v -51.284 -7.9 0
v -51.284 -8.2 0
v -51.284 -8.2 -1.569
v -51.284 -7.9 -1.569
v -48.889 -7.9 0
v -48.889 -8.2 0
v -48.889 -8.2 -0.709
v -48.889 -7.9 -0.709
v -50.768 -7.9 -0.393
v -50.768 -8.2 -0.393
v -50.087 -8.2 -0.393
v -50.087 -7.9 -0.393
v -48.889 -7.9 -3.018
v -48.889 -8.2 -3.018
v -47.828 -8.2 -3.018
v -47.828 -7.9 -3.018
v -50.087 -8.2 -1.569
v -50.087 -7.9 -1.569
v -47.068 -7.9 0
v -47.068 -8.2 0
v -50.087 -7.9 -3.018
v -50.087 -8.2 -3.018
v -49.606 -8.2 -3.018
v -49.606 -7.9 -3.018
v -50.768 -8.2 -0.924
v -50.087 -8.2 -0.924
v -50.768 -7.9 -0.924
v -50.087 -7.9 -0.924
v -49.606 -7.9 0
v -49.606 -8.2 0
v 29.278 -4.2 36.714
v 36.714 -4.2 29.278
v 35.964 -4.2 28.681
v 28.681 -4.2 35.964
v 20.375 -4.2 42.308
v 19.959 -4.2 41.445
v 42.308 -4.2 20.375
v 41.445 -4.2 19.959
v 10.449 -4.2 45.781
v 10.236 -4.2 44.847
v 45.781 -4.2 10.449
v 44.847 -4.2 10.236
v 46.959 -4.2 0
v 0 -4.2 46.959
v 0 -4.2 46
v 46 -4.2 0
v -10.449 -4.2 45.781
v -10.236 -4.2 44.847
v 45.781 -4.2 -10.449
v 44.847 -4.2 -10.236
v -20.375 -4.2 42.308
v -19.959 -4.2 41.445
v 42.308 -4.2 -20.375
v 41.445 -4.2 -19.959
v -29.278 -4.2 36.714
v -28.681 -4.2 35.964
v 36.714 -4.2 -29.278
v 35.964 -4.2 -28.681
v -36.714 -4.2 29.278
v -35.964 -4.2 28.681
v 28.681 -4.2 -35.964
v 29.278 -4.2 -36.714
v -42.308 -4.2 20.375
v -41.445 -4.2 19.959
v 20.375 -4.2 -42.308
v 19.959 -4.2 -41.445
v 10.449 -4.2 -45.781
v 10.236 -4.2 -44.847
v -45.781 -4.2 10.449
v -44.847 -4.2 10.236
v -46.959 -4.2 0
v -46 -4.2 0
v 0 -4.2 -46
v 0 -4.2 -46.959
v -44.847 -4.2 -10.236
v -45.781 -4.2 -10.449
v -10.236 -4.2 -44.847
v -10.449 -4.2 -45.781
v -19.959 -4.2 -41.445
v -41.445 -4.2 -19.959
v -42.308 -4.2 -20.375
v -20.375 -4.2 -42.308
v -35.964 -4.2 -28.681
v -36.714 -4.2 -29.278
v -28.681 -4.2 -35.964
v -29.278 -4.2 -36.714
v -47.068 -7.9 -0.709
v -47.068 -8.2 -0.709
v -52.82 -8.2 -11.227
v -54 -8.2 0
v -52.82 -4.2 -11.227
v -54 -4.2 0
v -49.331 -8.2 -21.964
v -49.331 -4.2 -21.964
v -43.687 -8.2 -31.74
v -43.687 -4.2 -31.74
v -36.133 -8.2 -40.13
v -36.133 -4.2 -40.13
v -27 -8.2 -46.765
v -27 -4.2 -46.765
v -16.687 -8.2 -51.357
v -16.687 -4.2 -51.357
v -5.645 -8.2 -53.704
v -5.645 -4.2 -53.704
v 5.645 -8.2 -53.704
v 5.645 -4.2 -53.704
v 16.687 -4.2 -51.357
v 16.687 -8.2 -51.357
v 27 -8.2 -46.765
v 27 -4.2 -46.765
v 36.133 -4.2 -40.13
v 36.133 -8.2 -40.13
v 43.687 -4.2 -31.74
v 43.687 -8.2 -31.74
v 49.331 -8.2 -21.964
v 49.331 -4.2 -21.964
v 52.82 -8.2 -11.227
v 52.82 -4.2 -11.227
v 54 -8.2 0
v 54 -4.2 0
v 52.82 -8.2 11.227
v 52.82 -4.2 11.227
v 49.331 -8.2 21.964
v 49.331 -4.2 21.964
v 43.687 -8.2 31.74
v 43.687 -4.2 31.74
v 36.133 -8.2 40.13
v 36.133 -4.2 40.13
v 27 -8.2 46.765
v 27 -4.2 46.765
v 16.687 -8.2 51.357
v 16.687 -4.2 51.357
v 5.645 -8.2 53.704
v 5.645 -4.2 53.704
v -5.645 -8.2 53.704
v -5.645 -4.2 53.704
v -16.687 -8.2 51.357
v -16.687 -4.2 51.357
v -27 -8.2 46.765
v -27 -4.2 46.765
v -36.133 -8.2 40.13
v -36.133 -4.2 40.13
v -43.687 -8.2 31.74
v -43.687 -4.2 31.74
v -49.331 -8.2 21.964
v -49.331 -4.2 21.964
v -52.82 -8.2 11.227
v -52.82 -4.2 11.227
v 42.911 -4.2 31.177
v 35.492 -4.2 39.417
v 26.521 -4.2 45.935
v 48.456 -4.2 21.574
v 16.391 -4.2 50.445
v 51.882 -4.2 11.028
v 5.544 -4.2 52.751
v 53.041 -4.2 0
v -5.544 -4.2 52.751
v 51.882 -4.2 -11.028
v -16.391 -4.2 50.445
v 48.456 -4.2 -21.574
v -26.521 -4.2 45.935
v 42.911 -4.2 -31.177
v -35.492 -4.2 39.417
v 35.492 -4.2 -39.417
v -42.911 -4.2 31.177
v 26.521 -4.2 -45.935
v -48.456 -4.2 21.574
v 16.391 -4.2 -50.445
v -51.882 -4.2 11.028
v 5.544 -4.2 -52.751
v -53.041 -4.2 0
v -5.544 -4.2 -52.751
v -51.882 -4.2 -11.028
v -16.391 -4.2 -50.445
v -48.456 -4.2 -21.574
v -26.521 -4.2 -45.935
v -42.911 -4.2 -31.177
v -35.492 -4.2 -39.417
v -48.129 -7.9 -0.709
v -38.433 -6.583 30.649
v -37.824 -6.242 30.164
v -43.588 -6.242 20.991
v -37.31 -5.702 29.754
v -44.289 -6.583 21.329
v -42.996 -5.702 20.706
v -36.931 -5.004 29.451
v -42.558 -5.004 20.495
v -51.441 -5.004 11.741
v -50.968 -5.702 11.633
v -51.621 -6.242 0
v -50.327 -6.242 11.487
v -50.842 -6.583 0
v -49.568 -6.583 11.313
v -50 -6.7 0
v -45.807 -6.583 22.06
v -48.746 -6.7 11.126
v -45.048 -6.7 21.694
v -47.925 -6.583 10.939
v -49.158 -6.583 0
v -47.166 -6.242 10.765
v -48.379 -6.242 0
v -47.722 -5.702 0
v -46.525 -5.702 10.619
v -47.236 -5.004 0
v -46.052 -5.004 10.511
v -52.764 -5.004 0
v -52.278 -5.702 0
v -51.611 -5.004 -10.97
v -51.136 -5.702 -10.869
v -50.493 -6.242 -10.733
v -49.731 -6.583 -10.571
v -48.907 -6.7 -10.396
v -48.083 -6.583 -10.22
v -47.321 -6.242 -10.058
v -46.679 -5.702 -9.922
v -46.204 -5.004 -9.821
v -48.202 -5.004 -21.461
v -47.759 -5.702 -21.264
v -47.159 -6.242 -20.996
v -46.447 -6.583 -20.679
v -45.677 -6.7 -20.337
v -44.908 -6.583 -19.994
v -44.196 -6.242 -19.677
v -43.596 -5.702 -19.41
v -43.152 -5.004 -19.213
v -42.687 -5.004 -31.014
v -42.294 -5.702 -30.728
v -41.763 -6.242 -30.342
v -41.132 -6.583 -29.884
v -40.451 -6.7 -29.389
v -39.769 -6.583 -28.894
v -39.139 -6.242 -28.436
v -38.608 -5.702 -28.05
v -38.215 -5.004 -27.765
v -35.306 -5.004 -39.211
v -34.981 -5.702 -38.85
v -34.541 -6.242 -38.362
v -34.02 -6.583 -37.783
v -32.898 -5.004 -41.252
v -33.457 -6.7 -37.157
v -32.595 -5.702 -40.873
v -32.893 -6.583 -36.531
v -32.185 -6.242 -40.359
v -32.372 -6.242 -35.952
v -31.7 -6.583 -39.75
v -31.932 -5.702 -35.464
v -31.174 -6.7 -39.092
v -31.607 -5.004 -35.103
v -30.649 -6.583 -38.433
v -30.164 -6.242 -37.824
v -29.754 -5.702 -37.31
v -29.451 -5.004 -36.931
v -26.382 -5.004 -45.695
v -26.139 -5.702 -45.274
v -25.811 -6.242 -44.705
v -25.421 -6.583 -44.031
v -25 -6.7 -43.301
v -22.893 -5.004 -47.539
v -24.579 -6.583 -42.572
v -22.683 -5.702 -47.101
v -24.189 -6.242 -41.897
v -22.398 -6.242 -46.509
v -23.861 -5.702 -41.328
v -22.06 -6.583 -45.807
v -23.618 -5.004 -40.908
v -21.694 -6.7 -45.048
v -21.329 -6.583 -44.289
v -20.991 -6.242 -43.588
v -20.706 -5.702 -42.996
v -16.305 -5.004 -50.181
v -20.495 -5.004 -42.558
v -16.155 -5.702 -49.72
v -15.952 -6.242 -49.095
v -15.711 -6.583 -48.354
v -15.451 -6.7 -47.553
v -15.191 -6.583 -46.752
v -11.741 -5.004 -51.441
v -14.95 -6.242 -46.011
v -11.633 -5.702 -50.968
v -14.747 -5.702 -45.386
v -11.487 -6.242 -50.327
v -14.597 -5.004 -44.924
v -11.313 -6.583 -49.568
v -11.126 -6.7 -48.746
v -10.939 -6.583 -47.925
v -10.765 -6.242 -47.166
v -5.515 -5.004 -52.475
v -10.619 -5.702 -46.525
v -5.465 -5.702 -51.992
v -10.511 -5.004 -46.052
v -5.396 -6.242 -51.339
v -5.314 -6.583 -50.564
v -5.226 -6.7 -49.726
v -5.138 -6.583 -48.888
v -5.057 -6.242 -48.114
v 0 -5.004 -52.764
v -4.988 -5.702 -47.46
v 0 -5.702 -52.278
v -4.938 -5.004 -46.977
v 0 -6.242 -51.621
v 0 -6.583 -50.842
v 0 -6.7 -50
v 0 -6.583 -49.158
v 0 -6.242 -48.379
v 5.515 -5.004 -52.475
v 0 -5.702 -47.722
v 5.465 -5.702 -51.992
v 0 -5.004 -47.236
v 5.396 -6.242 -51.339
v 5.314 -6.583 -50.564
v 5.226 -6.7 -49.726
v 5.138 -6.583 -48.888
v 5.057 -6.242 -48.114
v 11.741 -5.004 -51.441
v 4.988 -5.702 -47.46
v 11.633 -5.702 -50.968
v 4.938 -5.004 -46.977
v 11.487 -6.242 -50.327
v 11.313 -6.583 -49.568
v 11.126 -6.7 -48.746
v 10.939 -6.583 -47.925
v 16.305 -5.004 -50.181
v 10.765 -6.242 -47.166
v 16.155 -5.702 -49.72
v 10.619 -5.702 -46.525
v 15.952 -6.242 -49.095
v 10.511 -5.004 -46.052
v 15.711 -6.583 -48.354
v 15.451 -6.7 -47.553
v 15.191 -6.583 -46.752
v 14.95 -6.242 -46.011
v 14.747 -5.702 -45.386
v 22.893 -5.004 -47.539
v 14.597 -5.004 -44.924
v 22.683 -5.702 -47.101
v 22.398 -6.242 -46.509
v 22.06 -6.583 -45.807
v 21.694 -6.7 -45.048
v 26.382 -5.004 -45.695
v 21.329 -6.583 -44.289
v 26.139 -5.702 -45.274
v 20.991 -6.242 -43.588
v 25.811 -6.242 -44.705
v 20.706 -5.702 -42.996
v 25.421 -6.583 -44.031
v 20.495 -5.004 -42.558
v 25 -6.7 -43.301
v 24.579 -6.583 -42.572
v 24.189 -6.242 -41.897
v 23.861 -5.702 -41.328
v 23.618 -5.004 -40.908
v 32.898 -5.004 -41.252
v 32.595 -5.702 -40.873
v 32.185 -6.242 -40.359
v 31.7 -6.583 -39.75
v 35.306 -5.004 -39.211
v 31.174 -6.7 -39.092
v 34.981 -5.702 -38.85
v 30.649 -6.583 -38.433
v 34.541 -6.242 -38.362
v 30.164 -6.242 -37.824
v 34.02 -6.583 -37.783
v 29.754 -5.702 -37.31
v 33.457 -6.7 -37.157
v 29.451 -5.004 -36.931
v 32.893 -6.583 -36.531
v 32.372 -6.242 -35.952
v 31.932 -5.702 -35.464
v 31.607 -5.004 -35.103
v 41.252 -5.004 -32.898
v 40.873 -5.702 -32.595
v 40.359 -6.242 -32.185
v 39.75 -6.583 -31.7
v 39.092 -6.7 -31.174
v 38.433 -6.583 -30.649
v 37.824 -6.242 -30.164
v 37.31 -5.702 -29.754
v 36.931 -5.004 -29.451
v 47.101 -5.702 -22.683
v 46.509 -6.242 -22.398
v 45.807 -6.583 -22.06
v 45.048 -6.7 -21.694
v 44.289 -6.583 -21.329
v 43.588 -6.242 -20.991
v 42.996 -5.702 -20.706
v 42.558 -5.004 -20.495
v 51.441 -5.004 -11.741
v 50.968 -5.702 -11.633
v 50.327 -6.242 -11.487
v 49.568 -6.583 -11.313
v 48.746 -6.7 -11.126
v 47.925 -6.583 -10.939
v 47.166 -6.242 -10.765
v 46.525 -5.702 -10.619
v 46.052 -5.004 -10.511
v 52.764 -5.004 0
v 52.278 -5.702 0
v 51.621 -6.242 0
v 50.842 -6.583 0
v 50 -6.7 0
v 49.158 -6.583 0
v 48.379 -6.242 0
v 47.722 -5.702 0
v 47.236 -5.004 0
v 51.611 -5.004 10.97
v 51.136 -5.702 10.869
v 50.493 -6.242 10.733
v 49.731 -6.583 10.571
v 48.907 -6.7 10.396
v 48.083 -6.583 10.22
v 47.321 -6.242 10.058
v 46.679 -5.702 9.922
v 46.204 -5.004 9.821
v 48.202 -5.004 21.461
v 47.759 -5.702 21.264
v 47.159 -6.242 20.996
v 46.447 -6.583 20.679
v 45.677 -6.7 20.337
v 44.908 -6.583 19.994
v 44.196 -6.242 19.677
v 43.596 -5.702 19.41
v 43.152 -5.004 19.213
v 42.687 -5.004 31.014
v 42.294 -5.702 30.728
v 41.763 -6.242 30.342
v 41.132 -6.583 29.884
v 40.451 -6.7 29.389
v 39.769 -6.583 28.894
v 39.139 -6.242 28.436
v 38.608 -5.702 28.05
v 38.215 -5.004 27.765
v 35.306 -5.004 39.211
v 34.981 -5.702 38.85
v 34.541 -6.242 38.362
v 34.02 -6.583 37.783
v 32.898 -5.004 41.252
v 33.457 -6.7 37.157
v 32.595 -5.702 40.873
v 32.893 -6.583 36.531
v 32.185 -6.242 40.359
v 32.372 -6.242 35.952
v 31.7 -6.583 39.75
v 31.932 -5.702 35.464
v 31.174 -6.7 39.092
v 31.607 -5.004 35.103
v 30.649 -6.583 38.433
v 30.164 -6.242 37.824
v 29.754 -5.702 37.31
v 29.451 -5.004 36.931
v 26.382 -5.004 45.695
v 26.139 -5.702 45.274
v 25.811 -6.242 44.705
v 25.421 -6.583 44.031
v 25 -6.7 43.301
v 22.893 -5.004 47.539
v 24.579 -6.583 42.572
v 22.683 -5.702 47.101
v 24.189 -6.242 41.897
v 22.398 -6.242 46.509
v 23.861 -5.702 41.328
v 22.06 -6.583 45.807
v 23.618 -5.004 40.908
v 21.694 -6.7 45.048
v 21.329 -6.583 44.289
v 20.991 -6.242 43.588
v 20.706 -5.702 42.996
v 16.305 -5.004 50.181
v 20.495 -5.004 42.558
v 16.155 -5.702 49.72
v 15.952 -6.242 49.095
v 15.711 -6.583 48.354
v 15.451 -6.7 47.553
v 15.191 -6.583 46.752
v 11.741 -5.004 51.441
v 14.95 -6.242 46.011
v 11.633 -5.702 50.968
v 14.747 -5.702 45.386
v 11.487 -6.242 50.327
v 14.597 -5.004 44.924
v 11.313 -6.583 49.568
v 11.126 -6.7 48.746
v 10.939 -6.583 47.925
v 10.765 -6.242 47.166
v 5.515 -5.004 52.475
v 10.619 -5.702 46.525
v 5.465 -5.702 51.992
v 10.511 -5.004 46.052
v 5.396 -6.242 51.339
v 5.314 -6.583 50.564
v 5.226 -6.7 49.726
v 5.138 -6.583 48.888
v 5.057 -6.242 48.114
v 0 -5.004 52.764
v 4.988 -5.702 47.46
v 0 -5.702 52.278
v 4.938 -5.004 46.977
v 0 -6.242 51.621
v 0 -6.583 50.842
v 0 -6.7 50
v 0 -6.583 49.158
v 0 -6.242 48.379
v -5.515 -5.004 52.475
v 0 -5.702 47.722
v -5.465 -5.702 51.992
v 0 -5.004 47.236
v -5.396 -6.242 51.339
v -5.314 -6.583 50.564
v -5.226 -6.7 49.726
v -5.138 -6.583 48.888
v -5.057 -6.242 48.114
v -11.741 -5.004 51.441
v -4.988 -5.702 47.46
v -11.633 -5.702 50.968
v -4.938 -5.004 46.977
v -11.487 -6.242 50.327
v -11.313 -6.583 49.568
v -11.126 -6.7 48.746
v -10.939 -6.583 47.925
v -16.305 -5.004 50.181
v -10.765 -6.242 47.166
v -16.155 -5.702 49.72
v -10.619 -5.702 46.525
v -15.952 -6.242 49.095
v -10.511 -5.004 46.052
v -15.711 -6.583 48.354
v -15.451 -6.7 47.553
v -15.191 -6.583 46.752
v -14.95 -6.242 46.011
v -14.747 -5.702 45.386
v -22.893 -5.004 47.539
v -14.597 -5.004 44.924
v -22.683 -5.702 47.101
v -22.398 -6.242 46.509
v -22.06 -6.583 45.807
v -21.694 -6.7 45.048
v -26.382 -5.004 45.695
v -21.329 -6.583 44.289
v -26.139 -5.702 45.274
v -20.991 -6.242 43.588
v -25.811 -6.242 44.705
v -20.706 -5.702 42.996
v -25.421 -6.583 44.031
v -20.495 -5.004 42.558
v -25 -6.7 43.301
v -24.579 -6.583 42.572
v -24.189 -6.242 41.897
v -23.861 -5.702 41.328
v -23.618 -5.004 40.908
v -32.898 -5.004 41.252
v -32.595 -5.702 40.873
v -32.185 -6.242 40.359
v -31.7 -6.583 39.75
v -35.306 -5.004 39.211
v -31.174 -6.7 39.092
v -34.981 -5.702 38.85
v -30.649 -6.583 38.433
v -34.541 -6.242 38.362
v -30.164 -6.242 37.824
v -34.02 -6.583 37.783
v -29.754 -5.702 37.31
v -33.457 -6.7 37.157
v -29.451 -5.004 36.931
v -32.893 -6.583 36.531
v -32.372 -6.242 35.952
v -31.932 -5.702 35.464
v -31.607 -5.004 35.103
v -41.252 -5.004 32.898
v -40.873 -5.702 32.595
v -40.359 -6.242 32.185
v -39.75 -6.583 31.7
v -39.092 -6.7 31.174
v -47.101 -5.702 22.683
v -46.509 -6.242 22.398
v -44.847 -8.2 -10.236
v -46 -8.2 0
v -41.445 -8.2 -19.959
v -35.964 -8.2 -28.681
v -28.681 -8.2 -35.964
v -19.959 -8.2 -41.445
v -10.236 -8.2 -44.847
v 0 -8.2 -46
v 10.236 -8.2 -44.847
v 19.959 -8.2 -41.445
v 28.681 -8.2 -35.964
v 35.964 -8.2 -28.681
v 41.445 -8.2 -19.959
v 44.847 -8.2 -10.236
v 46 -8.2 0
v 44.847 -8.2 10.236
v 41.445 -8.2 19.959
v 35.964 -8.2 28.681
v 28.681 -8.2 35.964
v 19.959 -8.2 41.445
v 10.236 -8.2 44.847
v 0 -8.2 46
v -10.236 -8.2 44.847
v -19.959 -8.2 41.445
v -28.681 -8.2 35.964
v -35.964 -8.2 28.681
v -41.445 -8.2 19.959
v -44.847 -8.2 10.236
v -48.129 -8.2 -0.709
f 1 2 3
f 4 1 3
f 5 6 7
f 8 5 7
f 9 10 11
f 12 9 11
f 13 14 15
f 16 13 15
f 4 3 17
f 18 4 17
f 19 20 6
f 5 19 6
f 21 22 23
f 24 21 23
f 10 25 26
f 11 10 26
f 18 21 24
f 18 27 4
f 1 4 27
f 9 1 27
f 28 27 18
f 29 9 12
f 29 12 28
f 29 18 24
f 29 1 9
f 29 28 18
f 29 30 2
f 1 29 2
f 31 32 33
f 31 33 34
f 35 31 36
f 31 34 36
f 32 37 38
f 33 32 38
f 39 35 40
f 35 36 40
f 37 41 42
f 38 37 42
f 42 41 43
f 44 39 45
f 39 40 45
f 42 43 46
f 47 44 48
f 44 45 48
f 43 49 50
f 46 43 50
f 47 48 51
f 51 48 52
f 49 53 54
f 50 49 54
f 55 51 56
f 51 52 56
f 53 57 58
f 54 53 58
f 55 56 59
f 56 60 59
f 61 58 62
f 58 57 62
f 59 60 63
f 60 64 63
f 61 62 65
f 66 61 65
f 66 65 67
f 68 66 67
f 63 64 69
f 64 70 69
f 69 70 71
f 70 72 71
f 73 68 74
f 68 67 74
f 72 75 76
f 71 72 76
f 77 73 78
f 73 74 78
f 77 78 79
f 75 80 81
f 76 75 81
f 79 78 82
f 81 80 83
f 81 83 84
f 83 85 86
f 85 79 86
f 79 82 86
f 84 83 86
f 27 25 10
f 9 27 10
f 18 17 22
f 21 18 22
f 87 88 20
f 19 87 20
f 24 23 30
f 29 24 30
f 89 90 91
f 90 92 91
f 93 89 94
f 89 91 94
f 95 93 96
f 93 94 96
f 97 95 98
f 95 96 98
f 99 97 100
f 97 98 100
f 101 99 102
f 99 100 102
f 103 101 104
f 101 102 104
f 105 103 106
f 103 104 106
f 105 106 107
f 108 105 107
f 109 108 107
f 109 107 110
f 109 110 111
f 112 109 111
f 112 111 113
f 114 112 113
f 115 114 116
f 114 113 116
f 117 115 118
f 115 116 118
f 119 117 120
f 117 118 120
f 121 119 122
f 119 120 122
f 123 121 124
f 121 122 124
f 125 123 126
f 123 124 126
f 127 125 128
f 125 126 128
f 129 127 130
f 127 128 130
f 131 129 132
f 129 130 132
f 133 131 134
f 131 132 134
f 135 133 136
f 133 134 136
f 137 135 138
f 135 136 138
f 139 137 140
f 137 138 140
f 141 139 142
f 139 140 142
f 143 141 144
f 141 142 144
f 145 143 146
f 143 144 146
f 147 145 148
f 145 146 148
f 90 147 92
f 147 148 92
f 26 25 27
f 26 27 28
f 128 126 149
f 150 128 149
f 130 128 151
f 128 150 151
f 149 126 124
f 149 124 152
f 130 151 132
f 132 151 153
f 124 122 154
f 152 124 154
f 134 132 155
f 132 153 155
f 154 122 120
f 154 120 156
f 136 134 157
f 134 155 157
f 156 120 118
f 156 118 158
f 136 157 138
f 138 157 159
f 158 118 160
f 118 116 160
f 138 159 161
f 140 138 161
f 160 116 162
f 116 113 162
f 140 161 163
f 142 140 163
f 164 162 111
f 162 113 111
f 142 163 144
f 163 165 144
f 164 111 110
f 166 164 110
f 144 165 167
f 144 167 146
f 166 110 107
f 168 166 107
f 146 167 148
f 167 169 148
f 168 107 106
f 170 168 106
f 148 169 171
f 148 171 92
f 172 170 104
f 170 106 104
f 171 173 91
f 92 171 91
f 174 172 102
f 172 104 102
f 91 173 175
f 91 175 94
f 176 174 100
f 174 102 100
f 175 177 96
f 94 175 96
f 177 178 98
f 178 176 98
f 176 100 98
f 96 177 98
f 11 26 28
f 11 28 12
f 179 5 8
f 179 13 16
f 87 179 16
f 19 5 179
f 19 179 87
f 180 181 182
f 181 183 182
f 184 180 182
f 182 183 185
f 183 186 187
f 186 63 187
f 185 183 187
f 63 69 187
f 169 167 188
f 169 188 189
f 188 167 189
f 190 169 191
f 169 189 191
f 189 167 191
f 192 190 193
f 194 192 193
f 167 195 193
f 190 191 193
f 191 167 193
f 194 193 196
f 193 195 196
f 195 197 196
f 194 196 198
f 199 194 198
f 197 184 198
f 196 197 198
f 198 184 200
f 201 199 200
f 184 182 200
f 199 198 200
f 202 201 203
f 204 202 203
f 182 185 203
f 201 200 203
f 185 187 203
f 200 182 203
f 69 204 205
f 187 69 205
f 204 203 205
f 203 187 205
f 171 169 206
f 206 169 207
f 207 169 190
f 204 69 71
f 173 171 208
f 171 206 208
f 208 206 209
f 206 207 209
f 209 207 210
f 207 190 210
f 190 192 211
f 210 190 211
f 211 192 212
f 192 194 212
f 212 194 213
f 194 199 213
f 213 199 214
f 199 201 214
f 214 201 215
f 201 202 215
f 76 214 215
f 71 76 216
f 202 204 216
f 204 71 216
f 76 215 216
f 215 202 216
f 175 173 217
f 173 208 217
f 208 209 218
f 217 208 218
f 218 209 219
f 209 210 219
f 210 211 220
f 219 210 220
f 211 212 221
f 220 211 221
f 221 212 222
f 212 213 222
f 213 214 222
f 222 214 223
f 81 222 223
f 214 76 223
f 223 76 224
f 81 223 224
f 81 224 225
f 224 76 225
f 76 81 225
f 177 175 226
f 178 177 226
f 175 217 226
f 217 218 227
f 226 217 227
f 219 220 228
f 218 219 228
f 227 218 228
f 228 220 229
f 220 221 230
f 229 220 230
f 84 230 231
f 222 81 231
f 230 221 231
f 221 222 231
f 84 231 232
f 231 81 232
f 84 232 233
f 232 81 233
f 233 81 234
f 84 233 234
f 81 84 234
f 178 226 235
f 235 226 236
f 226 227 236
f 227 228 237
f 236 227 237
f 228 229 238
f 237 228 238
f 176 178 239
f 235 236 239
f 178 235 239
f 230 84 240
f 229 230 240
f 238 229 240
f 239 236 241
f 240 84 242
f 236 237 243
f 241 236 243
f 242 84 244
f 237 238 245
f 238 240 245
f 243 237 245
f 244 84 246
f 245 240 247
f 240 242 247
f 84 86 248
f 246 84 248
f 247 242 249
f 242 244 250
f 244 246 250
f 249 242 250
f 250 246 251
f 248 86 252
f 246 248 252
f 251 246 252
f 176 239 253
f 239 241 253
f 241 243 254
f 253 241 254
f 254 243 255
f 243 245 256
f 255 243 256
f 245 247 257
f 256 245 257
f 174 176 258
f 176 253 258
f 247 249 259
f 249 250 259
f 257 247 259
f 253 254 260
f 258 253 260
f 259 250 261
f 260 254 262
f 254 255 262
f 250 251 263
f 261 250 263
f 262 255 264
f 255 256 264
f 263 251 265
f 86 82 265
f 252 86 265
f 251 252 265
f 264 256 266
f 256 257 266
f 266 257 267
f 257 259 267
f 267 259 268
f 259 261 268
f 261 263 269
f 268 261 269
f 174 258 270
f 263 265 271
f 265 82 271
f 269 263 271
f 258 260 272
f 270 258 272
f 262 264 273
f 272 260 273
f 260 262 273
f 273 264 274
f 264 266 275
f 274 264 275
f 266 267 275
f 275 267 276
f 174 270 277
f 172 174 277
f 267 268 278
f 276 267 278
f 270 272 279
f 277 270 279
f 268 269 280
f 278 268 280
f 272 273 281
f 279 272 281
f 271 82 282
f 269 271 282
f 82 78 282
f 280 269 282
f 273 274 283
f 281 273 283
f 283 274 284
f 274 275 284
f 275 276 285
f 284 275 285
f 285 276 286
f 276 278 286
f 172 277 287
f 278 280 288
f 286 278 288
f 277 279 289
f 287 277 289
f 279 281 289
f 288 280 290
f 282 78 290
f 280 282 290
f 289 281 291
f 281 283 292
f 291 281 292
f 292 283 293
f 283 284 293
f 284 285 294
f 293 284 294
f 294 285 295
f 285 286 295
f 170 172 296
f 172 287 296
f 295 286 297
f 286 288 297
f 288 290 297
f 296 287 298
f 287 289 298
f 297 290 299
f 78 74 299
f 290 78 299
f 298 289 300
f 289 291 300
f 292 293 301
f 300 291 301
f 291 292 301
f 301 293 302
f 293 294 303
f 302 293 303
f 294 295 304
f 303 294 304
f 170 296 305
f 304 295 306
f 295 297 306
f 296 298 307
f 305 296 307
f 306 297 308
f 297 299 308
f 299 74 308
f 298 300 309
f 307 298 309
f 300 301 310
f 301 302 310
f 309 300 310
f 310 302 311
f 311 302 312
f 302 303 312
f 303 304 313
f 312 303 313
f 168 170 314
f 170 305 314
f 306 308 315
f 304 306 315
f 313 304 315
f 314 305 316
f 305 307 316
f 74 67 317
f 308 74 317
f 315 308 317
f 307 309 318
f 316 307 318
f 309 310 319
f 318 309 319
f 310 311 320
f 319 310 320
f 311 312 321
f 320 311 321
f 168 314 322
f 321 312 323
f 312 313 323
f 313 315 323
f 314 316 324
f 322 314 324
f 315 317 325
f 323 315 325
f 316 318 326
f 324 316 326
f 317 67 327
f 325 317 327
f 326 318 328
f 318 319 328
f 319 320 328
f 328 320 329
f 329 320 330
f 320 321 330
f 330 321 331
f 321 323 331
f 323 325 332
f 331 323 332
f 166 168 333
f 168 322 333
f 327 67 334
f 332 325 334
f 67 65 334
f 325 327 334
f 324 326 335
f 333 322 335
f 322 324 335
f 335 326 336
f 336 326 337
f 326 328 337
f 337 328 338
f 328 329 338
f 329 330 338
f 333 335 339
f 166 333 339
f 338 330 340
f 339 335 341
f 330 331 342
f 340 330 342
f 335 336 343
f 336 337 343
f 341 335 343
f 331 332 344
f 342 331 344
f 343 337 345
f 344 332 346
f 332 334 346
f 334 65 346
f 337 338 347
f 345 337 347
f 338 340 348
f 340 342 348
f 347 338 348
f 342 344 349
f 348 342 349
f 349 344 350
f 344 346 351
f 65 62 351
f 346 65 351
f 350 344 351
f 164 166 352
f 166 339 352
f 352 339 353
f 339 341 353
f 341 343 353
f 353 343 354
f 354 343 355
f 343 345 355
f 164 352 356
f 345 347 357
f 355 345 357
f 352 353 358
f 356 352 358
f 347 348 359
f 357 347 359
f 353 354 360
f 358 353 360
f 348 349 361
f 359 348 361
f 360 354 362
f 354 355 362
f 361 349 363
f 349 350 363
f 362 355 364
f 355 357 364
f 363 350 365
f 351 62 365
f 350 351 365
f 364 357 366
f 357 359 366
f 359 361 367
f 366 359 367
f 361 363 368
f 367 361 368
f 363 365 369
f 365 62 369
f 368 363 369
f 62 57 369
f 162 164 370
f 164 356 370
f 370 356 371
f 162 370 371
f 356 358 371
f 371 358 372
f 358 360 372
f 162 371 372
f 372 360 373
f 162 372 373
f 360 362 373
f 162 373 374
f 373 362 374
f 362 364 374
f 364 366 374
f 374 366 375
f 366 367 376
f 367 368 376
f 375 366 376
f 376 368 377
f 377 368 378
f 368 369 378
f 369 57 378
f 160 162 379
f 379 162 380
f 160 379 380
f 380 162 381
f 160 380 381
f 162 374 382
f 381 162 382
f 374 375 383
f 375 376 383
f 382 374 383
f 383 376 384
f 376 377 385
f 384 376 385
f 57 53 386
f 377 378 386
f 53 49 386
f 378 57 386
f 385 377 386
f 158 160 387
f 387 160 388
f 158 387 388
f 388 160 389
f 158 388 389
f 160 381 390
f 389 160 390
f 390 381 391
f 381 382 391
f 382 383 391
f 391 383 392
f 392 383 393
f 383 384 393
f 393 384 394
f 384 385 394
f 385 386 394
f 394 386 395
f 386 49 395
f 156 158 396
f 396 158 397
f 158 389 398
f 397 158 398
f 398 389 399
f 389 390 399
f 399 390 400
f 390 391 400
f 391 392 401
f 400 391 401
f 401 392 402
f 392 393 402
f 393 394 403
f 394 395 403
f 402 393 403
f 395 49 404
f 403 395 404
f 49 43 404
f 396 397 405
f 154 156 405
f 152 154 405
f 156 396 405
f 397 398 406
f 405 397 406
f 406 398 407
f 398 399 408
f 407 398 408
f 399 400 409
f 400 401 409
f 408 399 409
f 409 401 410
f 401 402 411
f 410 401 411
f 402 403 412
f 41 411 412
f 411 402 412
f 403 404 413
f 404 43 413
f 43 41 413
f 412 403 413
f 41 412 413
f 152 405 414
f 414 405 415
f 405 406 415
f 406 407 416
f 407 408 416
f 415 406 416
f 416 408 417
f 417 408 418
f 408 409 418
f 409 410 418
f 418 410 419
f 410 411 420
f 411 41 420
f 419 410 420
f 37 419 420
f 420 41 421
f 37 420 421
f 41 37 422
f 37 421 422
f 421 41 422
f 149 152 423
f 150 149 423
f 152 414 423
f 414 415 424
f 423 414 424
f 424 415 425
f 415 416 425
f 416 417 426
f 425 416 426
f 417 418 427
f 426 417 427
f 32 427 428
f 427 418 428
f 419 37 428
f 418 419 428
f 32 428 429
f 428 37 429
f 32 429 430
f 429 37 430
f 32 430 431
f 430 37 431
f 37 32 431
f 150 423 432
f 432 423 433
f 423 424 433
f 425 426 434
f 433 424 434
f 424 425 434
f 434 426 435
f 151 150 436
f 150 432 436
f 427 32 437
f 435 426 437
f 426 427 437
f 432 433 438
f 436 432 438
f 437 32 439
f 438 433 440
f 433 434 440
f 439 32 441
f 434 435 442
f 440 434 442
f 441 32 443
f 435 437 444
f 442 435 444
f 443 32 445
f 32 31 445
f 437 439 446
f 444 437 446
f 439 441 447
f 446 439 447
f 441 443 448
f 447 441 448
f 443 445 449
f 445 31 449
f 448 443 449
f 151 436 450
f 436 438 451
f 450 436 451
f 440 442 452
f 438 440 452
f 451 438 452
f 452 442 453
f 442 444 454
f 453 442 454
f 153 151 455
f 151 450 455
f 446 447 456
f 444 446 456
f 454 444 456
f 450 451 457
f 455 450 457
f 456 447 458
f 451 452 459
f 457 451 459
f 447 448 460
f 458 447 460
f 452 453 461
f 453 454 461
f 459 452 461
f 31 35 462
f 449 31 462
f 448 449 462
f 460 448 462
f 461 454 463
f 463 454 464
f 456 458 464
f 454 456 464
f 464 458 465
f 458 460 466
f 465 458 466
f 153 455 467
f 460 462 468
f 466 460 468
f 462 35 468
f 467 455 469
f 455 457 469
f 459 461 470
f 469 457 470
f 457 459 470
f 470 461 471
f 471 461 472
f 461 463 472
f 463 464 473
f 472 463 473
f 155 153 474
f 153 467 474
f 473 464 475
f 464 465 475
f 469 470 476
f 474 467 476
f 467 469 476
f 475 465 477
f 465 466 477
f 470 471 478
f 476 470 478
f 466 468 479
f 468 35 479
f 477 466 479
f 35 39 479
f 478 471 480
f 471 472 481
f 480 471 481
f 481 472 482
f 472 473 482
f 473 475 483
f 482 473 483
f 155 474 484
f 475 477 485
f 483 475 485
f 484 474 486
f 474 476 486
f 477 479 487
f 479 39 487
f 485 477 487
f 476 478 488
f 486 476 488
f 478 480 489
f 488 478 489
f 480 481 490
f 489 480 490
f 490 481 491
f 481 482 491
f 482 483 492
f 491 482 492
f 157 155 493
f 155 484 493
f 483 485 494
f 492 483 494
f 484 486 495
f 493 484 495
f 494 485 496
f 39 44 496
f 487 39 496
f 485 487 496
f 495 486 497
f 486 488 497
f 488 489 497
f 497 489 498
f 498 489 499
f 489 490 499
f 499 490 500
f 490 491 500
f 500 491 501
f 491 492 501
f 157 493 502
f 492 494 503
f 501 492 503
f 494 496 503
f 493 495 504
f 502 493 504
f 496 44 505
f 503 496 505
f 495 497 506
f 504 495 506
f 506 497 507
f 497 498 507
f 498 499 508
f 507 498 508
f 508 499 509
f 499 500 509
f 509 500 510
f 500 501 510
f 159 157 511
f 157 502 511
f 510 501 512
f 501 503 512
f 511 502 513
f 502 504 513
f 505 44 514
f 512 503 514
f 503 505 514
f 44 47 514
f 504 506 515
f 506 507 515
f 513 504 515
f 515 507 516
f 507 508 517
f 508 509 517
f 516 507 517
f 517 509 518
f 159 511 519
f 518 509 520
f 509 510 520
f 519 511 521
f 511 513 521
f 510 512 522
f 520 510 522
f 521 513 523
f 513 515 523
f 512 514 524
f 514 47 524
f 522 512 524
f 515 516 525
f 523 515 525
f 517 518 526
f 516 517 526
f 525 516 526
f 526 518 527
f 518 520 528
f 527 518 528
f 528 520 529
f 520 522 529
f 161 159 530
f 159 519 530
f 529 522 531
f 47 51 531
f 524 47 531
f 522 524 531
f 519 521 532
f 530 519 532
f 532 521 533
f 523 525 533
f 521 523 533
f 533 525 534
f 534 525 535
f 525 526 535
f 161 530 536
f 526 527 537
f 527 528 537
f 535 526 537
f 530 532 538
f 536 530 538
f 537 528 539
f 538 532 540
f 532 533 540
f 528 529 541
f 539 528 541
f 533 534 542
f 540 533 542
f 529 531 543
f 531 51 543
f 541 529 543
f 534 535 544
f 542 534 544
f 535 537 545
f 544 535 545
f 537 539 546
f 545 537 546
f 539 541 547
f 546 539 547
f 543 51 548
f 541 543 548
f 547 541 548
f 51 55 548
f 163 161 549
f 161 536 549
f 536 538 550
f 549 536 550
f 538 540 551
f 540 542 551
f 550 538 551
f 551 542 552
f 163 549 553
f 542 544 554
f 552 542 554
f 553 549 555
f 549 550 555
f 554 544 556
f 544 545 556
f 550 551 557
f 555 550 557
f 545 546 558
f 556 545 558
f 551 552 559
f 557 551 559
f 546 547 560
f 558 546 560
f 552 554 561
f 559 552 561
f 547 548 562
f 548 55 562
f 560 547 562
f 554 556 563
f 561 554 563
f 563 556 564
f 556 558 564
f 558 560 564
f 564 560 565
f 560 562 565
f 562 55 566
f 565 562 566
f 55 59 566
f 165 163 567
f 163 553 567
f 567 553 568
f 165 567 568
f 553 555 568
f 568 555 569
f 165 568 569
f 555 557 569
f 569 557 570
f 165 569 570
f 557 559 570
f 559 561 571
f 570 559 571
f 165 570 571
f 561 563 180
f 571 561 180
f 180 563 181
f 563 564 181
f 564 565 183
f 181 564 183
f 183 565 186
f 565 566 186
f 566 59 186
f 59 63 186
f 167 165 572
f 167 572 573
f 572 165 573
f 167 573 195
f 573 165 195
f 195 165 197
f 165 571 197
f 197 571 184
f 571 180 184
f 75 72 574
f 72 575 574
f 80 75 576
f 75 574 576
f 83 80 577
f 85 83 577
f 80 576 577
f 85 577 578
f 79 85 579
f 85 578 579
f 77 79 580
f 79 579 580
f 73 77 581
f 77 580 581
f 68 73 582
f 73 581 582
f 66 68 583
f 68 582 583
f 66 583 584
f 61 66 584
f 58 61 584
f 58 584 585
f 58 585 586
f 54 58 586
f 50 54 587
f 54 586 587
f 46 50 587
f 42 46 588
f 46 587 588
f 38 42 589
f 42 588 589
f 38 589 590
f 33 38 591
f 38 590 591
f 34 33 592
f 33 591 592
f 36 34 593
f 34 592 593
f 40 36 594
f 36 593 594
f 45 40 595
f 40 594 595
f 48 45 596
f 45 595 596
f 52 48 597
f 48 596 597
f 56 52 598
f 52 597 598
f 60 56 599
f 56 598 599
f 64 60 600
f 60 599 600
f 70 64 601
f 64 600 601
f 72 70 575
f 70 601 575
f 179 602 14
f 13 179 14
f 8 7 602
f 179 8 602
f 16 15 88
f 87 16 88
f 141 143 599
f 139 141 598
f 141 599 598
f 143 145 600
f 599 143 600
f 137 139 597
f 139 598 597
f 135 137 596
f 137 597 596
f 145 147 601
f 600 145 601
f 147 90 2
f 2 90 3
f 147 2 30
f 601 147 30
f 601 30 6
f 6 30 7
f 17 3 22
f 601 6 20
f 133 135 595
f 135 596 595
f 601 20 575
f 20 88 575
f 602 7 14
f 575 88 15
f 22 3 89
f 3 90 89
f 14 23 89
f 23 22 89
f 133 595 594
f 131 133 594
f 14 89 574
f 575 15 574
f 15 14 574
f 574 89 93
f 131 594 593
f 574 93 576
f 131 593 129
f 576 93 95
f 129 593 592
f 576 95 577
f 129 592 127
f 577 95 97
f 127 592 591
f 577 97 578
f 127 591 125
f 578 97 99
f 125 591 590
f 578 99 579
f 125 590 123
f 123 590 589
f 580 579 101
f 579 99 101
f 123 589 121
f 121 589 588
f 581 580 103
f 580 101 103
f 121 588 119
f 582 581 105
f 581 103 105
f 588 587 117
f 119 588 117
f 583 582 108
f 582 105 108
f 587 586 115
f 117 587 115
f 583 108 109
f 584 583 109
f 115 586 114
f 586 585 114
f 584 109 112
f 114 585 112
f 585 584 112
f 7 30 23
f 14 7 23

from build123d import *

# Parameters (mm, degrees)
SKETCH4_W          = 0.681153679
SKETCH4_H          = 0.530582866
CUT_EXTRUDE1_DEPTH = 0.3


with BuildPart() as part:
    # Sketch2 → Revolve2 (revolve)
    with BuildSketch(Plane.XY):
        with BuildLine():
            Line((-46, -4.2), (-46, -6.7))
            Line((-46, -6.7), (-46, -8.2))
            Line((-46, -8.2), (-54, -8.2))
            Line((-54, -8.2), (-54, -4.2))
            Line((-54, -4.2), (-53.041381265, -4.2))
            ThreePointArc((-53.041381265, -4.2), (-50, -6.7), (-46.958618735, -4.2))
            Line((-46.958618735, -4.2), (-46, -4.2))
        make_face()
    revolve(axis=Axis((0, 30.712444699, 0), (0, -1, 0)))

    # Sketch4 → Cut-Extrude1 (cut)
    with BuildSketch(Plane.XZ.offset(8.2)):
        Polygon((-49.606287717, 0), (-51.284076779, 0), (-51.284076779, -1.569276179), (-50.086680312, -1.569276179), (-50.086680312, -3.017624002), (-49.606287717, -3.017624002), (-49.606287717, -1.569276179), align=None)
        with Locations((-50.427257152, -0.658681261)):
            Rectangle(SKETCH4_W, SKETCH4_H, mode=Mode.SUBTRACT)
        Polygon((-47.068094007, 0), (-48.889283844, 0), (-48.889283844, -0.708871532), (-48.129259739, -0.708871532), (-48.889283844, -3.017624002), (-47.828118112, -3.017624002), (-47.068094007, -0.708871532), align=None)
    extrude(amount=-CUT_EXTRUDE1_DEPTH, mode=Mode.SUBTRACT)


solid = part.part
